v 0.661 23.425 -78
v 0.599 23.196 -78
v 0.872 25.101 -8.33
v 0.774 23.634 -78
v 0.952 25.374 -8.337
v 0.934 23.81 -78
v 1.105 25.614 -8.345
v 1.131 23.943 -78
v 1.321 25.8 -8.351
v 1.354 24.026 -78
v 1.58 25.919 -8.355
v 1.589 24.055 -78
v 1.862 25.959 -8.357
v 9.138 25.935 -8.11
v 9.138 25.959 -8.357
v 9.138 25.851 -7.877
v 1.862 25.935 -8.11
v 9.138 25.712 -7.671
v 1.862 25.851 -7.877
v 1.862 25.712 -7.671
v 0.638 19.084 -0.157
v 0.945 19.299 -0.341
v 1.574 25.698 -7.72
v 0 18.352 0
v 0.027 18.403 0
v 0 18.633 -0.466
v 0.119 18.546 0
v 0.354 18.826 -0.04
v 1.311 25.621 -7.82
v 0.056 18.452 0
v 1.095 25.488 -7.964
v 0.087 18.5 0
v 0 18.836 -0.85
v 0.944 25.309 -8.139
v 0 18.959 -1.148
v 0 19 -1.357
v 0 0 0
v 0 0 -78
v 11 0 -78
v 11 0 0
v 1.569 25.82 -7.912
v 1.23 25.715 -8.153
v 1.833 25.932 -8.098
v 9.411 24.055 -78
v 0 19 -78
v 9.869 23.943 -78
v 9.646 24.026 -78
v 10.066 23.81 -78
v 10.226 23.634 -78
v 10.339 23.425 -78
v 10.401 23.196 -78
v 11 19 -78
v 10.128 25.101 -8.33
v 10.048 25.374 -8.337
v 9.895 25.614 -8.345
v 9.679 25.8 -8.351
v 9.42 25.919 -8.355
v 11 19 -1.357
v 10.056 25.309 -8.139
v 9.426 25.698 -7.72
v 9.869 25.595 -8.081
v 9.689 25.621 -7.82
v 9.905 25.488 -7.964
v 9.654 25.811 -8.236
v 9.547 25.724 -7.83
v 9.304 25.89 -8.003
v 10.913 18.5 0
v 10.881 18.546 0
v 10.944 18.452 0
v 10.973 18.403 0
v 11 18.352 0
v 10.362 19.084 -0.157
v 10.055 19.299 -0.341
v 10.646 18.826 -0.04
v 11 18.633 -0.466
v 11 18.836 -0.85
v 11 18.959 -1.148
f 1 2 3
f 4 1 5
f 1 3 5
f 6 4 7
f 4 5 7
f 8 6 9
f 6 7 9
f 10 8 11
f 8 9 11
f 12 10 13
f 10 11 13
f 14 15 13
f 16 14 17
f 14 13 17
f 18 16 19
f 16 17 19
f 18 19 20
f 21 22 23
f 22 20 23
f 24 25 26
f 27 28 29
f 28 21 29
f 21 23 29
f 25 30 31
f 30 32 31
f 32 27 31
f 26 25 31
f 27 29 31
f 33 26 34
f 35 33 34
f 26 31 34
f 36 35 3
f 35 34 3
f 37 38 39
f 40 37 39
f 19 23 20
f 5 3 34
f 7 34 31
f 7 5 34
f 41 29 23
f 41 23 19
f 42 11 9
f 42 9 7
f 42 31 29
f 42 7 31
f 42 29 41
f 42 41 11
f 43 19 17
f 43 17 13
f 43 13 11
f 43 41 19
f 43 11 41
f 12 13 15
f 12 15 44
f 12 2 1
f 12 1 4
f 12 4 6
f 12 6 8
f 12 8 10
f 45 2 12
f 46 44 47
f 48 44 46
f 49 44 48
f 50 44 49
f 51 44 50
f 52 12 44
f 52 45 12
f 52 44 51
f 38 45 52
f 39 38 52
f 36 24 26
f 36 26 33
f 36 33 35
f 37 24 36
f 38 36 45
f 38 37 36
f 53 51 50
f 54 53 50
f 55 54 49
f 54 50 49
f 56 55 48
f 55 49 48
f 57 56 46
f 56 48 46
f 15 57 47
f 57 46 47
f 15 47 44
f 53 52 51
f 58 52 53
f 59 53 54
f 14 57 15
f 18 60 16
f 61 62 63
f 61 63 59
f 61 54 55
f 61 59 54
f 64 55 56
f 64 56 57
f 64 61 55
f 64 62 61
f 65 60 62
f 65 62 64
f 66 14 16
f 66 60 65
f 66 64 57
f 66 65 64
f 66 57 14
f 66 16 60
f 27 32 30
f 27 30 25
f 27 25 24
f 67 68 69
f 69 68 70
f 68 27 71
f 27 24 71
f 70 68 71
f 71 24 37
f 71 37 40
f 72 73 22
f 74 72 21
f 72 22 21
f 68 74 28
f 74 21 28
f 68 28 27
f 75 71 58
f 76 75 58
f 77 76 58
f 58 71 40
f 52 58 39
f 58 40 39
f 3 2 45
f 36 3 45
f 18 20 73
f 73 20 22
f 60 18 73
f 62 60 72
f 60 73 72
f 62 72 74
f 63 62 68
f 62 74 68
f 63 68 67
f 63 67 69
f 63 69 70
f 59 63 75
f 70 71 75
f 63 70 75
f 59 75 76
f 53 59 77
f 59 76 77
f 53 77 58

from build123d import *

# Parameters (mm, degrees)
CROQUIS1_W              = 11
CROQUIS1_H              = 78
SALIENTE_EXTRUIR1_DEPTH = 26
CORTAR_EXTRUIR3_DEPTH   = 83.95179323
CORTAR_EXTRUIR6_DEPTH   = 83.95179323
CORTAR_EXTRUIR7_DEPTH   = 83.95179323
REDONDEO4_R             = 1


with BuildPart() as part:
    # Croquis1 → Saliente-Extruir1 (new body)
    with BuildSketch(Plane(origin=(0, 0, 0), x_dir=(1, 0, 0), z_dir=(0, 1, 0))):
        with Locations((5.5, 39)):
            Rectangle(CROQUIS1_W, CROQUIS1_H)
    extrude(amount=SALIENTE_EXTRUIR1_DEPTH)

    # Croquis4 → Cortar-Extruir3 (cut, through all)
    with BuildSketch(Plane.XY):
        Polygon((0, 26), (1, 26), (0, 19), align=None)
        Polygon((10, 26), (11, 26), (11, 19), align=None)
    extrude(amount=-CORTAR_EXTRUIR3_DEPTH, mode=Mode.SUBTRACT)

    # Croquis6 → Cortar-Extruir6 (cut, through all)
    with BuildSketch(Plane.ZY):
        Polygon((0, 19), (0, 26), (-8, 26), align=None)
    extrude(amount=-CORTAR_EXTRUIR6_DEPTH, mode=Mode.SUBTRACT)

    # Croquis8 → Cortar-Extruir7 (cut, through all)
    with BuildSketch(Plane.ZY):
        Polygon((-80, 26), (-6.869978001, 26), (-80, 24), align=None)
    extrude(amount=-CORTAR_EXTRUIR7_DEPTH, mode=Mode.SUBTRACT)

    # Redondeo4
    # the kernel refuses this fillet: 1 mm, written as the material it takes off along each edge
    with BuildSketch(Plane(origin=(1.86153901, 24.959705258, -8.329683982), x_dir=(-0.5677189271234413, -0.022505525063317232, -0.8229147714845281), z_dir=(-0.44431309218949805, 0.8499040291343537, 0.28328257512631844))) as redondeo4_piece_1_section:
        Polygon((-1.655326892, -1.655326892), (1.655326892, -1.655326892), (1.655326892, 1.655326892), (-1.655326892, 1.655326892), align=None)
    redondeo4_piece_1 = extrude(amount=1.655326892, mode=Mode.PRIVATE)
    redondeo4_piece_1 = split(redondeo4_piece_1, bisect_by=Plane(origin=(1.86153901, 24.959705258, -8.329683982), z_dir=(-1, 0, 0)), keep=Keep.TOP, mode=Mode.PRIVATE)
    redondeo4_piece_1 = split(redondeo4_piece_1, bisect_by=Plane(origin=(1.86153901, 24.959705258, -8.329683982), z_dir=(0.09365858115816941, 0.6556100681071857, -0.7492686492653552)), keep=Keep.TOP, mode=Mode.PRIVATE)
    redondeo4_piece_1 = split(redondeo4_piece_1, bisect_by=Plane(origin=(1.86153901, 24.959705258, -8.329683982), z_dir=(0.0039054455429706233, 0.02733811880079436, 0.9996186146503798)), keep=Keep.TOP, mode=Mode.PRIVATE)
    redondeo4_piece_1 = split(redondeo4_piece_1, bisect_by=Plane(origin=(1.86153901, 25.959331496, -8.357022309), z_dir=(0, -0.9996262380814909, 0.027338327290574692)), keep=Keep.TOP, mode=Mode.PRIVATE)
    redondeo4_piece_1 = split(redondeo4_piece_1, bisect_by=Plane(origin=(1.86153901, 25.712281952, -7.671179374), z_dir=(0, -0.7525766947068778, -0.658504607868518)), keep=Keep.TOP, mode=Mode.PRIVATE)
    redondeo4_piece_1 = split(redondeo4_piece_1, bisect_by=Plane(origin=(0.871589516, 25.101126614, -8.329683982), z_dir=(0.9899494936611666, -0.14142135623730953, 0)), keep=Keep.TOP, mode=Mode.PRIVATE)
    redondeo4_piece_1 = redondeo4_piece_1 - Plane(origin=(1.86153901, 24.959705258, -8.329683982), x_dir=(0.44431309218949805, -0.8499040291343537, -0.28328257512631844), z_dir=(-0.5677189271234413, -0.022505525063317232, -0.8229147714845281)) * Sphere(REDONDEO4_R, mode=Mode.PRIVATE)
    add(redondeo4_piece_1, mode=Mode.SUBTRACT)
    with BuildSketch(Plane(origin=(9.13846099, 24.959705258, -8.329683982), x_dir=(-0.5677189271234413, 0.02250552506331723, 0.8229147714845281), z_dir=(0.44431309218949794, 0.8499040291343537, 0.2832825751263184))) as redondeo4_piece_2_section:
        Polygon((-1.655326892, -1.655326892), (1.655326892, -1.655326892), (1.655326892, 1.655326892), (-1.655326892, 1.655326892), align=None)
    redondeo4_piece_2 = extrude(amount=1.655326892, mode=Mode.PRIVATE)
    redondeo4_piece_2 = split(redondeo4_piece_2, bisect_by=Plane(origin=(9.13846099, 24.959705258, -8.329683982), z_dir=(1, 0, 0)), keep=Keep.TOP, mode=Mode.PRIVATE)
    redondeo4_piece_2 = split(redondeo4_piece_2, bisect_by=Plane(origin=(9.13846099, 24.959705258, -8.329683982), z_dir=(-0.09365858115816958, 0.6556100681071857, -0.7492686492653552)), keep=Keep.TOP, mode=Mode.PRIVATE)
    redondeo4_piece_2 = split(redondeo4_piece_2, bisect_by=Plane(origin=(9.13846099, 24.959705258, -8.329683982), z_dir=(-0.0039054455429706303, 0.02733811880079436, 0.9996186146503798)), keep=Keep.TOP, mode=Mode.PRIVATE)
    redondeo4_piece_2 = split(redondeo4_piece_2, bisect_by=Plane(origin=(9.13846099, 25.959331496, -8.357022309), z_dir=(0, -0.9996262380814909, 0.027338327290574692)), keep=Keep.TOP, mode=Mode.PRIVATE)
    redondeo4_piece_2 = split(redondeo4_piece_2, bisect_by=Plane(origin=(9.13846099, 25.712281952, -7.671179374), z_dir=(0, -0.7525766947068778, -0.658504607868518)), keep=Keep.TOP, mode=Mode.PRIVATE)
    redondeo4_piece_2 = split(redondeo4_piece_2, bisect_by=Plane(origin=(10.128410484, 25.101126614, -8.329683982), z_dir=(-0.9899494936611666, -0.14142135623730978, 0)), keep=Keep.TOP, mode=Mode.PRIVATE)
    redondeo4_piece_2 = redondeo4_piece_2 - Plane(origin=(9.13846099, 24.959705258, -8.329683982), x_dir=(-0.44431309218949794, -0.8499040291343537, -0.2832825751263184), z_dir=(-0.5677189271234413, 0.02250552506331723, 0.8229147714845281)) * Sphere(REDONDEO4_R, mode=Mode.PRIVATE)
    add(redondeo4_piece_2, mode=Mode.SUBTRACT)
    with BuildSketch(Plane(origin=(-1.134420566, 19, 0), x_dir=(0, -1, 0), z_dir=(1, 0, 0))) as redondeo4_piece_3:
        with BuildLine():
            CenterArc((REDONDEO4_R * 0.453768226592, REDONDEO4_R), REDONDEO4_R, 221.185925166, 48.814074834)
            Line((-REDONDEO4_R * 0.298808468115, REDONDEO4_R * 0.341495392131), (0, 0))
            Line((0, 0), (REDONDEO4_R * 0.453768226592, 0))
        make_face()
    extrude(amount=13.268841133, mode=Mode.SUBTRACT)
    with BuildSketch(Plane(origin=(0.96681533, 25.767707313, -7.734522643), x_dir=(0.9956043743251828, -0.06167460725908129, 0.07048526543895174), z_dir=(-0.09365858115816941, -0.6556100681071857, 0.7492686492653552)), Plane(origin=(12.052106546, 11.635254179, 8.416852367), x_dir=(-0.9956043743251827, -0.061674607259081395, 0.07048526543895185), z_dir=(-0.09365858115816958, 0.6556100681071857, -0.7492686492653552))) as redondeo4_piece_4:
        with BuildLine():
            CenterArc((REDONDEO4_R * 0.898673913625, -REDONDEO4_R), REDONDEO4_R, 90, 83.890414747)
            Line((-REDONDEO4_R * 0.0956462392286, -REDONDEO4_R * 0.893569583162), (0, 0))
            Line((0, 0), (REDONDEO4_R * 0.898673913625, 0))
        make_face()
    extrude(amount=21.556186859, mode=Mode.SUBTRACT)
    with BuildSketch(Plane(origin=(1.86153901, 25.970032196, -7.965751081), x_dir=(0, -0.6585046078685161, 0.7525766947068797), z_dir=(1, 0, 0))) as redondeo4_piece_5:
        with BuildLine():
            CenterArc((REDONDEO4_R * 0.391417524948, REDONDEO4_R), REDONDEO4_R, 227.247508882, 42.752491118)
            Line((-REDONDEO4_R * 0.287415146966, REDONDEO4_R * 0.265707004295), (0, 0))
            Line((0, 0), (REDONDEO4_R * 0.391417524948, 0))
        make_face()
    extrude(amount=7.27692198, mode=Mode.SUBTRACT)
    with BuildSketch(Plane(origin=(0.994203443, 25.9594241, -8.353636218), x_dir=(-0.14136742020391727, -0.9895719414274202, 0.027615670269893054), z_dir=(-0.0039054455429706233, -0.02733811880079436, -0.9996186146503798)), Plane(origin=(10.286368809, 23.995418339, -80.167528475), x_dir=(0.14136742020391577, -0.9895719414274206, 0.027615670269893058), z_dir=(-0.0039054455429706303, 0.02733811880079436, 0.9996186146503798))) as redondeo4_piece_6:
        with BuildLine():
            CenterArc((REDONDEO4_R * 0.867342181609, -REDONDEO4_R), REDONDEO4_R, 90, 81.872956917)
            Line((-REDONDEO4_R * 0.122614861744, -REDONDEO4_R * 0.85863150168), (0, 0))
            Line((0, 0), (REDONDEO4_R * 0.867342181609, 0))
        make_face()
    extrude(amount=71.841291473, mode=Mode.SUBTRACT)


solid = part.part
